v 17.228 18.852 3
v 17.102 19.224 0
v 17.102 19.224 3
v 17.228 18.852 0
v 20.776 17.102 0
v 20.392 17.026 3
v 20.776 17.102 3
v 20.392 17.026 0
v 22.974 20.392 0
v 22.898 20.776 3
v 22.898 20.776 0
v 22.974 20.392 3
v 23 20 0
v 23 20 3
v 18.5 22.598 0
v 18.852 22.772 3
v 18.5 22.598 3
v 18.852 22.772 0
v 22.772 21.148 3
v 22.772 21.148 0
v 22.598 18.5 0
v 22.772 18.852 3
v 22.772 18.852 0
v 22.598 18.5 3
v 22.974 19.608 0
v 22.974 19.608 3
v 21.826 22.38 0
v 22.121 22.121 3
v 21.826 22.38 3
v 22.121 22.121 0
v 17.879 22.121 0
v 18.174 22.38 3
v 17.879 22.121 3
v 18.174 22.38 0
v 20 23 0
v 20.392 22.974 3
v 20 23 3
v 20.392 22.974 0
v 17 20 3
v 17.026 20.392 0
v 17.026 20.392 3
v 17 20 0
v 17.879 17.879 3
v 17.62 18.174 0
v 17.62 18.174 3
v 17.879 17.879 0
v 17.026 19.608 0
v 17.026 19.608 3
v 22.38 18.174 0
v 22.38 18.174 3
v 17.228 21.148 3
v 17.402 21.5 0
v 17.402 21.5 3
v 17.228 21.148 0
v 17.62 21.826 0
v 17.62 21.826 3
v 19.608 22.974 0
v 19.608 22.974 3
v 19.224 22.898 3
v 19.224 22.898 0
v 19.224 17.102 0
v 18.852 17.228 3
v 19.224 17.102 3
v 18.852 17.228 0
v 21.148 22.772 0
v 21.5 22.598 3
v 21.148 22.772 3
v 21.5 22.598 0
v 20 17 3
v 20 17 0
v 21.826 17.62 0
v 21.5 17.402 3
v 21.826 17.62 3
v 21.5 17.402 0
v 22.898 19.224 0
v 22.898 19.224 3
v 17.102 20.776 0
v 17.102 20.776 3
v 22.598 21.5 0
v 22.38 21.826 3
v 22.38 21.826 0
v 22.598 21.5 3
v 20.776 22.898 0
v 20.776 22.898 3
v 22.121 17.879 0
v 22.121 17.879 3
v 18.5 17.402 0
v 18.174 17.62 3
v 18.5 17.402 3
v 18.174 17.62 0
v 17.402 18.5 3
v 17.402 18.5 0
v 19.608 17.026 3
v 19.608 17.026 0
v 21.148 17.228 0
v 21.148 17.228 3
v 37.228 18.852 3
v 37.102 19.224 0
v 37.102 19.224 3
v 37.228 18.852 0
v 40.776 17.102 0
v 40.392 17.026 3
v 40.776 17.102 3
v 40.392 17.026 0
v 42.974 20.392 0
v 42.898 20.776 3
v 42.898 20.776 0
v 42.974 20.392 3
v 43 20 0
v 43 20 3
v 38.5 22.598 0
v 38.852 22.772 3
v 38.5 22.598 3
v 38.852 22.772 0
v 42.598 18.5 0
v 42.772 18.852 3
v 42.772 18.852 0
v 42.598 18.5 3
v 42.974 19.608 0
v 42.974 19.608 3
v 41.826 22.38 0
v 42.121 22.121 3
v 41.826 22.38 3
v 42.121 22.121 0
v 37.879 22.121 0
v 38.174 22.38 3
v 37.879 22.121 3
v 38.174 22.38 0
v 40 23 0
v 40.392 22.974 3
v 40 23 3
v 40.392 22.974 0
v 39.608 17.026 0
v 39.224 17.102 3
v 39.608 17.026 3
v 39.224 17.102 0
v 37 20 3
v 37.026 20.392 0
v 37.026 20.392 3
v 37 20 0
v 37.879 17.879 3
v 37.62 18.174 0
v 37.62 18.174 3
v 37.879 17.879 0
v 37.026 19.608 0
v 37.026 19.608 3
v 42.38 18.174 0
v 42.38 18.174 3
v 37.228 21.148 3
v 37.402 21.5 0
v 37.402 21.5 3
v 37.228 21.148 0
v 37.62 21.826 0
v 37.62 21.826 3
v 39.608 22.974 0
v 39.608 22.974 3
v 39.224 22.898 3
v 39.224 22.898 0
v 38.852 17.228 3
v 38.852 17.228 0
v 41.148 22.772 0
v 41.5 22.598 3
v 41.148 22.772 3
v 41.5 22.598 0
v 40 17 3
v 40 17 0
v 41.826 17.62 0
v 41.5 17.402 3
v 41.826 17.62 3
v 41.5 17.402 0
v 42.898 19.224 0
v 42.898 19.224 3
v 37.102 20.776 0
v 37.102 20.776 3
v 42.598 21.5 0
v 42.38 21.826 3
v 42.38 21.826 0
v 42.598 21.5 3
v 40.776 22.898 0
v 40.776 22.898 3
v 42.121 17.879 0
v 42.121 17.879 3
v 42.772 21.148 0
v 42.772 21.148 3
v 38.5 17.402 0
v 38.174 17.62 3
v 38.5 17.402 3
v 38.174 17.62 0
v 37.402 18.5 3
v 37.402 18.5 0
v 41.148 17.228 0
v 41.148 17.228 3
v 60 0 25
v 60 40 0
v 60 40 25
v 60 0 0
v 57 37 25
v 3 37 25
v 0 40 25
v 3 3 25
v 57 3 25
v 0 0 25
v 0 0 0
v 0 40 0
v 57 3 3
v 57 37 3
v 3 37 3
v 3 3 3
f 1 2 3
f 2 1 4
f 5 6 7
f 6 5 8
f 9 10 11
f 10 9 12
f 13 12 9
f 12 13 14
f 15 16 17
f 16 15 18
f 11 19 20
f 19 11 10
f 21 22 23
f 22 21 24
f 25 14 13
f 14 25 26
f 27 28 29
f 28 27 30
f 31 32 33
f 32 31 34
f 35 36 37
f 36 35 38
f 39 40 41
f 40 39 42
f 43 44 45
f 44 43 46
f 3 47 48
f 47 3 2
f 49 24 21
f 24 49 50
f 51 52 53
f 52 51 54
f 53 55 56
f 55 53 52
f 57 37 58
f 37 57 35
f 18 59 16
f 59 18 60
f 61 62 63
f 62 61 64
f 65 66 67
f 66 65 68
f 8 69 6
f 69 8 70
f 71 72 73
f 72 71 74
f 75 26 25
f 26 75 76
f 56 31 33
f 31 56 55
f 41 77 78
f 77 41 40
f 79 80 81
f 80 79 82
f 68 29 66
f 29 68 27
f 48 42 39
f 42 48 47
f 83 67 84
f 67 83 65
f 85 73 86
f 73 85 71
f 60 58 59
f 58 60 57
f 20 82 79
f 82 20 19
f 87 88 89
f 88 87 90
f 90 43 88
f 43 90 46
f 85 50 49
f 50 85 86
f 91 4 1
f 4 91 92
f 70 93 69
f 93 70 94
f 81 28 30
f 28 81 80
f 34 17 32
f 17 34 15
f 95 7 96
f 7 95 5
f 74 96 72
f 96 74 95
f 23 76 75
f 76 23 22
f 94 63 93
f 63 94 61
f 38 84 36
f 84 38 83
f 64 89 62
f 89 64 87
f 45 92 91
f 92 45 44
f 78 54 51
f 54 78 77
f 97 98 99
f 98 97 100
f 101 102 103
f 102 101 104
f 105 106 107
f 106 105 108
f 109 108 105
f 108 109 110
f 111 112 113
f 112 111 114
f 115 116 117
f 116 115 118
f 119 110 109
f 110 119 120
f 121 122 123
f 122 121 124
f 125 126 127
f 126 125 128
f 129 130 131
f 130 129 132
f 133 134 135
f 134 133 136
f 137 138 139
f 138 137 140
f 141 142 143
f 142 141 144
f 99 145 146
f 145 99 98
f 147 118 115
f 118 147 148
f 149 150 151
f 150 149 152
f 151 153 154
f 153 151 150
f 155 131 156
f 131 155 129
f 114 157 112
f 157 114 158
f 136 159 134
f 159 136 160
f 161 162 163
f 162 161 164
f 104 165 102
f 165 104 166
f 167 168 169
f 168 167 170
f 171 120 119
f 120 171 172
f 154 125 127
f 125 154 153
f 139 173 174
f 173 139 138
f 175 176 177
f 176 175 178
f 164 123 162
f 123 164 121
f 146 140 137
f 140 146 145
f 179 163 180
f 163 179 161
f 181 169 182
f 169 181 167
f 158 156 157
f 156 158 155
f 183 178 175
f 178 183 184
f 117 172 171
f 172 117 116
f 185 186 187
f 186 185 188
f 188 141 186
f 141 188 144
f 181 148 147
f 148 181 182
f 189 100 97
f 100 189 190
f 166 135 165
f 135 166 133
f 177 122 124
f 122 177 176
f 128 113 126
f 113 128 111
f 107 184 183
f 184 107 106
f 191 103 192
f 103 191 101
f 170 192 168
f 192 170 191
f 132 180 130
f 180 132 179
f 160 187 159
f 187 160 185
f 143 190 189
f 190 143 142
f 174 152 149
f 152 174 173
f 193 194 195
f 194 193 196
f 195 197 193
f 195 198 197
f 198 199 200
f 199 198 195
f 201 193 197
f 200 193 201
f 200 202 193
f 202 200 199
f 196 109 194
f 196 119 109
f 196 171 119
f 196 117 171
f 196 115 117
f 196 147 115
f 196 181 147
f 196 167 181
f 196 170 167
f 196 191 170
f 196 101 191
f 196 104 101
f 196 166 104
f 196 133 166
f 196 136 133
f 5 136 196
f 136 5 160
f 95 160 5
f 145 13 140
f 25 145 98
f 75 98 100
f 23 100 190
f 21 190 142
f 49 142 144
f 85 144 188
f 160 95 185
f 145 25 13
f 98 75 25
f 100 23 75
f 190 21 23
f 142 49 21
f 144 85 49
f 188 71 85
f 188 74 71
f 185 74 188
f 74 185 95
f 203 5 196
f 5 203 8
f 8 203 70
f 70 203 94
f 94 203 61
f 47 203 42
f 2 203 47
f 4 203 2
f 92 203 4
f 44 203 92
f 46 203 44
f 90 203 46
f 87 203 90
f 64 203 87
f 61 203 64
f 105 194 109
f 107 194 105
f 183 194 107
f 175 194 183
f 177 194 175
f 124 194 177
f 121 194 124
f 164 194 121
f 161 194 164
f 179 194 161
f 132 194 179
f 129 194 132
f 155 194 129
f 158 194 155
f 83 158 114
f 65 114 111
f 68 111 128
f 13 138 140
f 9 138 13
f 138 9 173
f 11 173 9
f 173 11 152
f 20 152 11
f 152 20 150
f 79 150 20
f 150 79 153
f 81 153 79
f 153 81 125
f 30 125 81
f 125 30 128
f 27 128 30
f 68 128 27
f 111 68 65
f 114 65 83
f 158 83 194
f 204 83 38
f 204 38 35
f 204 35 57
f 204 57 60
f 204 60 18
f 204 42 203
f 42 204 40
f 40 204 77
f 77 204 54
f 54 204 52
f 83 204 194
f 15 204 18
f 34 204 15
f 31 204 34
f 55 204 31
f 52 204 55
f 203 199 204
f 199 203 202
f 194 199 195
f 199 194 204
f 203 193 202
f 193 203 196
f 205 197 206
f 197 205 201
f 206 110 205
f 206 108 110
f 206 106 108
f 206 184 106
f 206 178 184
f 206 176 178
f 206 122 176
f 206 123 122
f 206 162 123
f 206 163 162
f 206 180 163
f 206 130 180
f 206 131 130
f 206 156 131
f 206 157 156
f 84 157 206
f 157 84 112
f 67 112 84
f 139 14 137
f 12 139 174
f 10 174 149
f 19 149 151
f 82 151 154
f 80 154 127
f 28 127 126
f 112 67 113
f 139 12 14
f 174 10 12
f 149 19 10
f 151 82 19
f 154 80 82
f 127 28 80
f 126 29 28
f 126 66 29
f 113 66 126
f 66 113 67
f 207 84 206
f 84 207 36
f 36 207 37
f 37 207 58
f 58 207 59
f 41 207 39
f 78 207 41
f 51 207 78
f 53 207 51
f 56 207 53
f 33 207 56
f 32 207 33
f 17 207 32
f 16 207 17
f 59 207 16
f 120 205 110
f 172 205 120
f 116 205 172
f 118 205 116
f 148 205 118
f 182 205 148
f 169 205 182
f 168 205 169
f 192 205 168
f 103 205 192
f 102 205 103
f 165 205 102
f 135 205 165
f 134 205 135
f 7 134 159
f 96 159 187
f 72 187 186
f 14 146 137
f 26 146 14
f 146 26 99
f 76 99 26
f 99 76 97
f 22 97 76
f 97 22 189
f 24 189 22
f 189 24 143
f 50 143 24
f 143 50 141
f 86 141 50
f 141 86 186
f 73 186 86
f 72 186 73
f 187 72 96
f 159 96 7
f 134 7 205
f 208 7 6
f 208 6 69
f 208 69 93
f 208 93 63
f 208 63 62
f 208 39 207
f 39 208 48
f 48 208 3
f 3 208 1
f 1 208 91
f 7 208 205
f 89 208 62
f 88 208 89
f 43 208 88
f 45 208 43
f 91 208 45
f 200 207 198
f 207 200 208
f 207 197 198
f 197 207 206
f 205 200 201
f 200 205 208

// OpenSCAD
/* [Maße] */
// Breite der Box (mm)
width = 60; // [20:5:120]
// Tiefe der Box (mm)
depth = 40; // [20:5:100]
// Höhe der Box (mm)
height = 25; // [10:1:60]
// Wandstärke (mm)
wall = 3; // [1:0.5:8]

/* [Bohrungen] */
// Bohrungen im Boden anzeigen
holes = true;
// Durchmesser der Bohrungen (mm)
hole_d = 6; // [2:1:20]
// Anzahl der Bohrungen
hole_count = 2; // [1:1:5]

$fn = 48;

module holes_cutout() {
    for (i = [1:hole_count])
        translate([width * i / (hole_count + 1), depth / 2, -1])
            cylinder(d = hole_d, h = wall + 2);
}

difference() {
    cube([width, depth, height]);
    translate([wall, wall, wall]) cube([width - 2 * wall, depth - 2 * wall, height]);
    if (holes) holes_cutout();
}
